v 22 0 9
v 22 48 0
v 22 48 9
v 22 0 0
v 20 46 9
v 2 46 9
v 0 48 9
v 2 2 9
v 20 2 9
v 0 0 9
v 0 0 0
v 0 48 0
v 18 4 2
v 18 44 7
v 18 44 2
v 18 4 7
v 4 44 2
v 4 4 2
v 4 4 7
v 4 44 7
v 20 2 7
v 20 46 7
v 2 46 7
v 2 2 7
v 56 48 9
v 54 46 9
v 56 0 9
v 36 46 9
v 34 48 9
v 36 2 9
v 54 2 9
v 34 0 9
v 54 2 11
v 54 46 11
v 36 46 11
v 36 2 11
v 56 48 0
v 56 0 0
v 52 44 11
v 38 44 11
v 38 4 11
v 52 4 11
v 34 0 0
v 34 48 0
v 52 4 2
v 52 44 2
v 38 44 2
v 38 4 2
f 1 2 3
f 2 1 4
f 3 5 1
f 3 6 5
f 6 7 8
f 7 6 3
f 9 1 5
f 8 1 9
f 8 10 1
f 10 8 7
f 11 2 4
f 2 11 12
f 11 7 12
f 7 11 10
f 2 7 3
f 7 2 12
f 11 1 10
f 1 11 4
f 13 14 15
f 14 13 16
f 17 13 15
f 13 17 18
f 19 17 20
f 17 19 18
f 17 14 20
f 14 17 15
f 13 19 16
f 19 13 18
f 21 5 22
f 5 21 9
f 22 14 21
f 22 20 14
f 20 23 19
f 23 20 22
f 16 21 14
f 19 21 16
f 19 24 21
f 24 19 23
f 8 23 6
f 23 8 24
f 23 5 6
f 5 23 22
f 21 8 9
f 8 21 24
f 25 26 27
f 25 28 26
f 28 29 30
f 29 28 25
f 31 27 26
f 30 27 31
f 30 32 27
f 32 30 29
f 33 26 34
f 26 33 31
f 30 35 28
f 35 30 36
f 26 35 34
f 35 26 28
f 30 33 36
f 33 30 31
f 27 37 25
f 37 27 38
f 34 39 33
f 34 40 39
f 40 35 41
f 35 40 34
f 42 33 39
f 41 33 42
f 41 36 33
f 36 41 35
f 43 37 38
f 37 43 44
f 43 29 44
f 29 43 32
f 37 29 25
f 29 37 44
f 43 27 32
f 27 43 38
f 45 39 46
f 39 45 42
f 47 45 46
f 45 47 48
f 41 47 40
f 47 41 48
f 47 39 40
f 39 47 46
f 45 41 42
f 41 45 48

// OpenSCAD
// [FL_INDEX: keywords="openscad, 3d_parametric, custom_pres_fit_box, csg_solid" | COT="Parametric OpenSCAD design from 3DCodeverse"]
// Title: custom pres fit box 

//CUSTOMIZER VARIABLES

// Internal X measurement in mm.
x = 14;
// Internal Y measurement in mm.
y = 40;
// Internal Z measurement in mm.
z = 14;
//CUSTOMIZER VARIABLES END


difference(){
cube([x+8,y+8,(z/2)+2]);
translate([4,4,2])cube([x,y,(z/2)+1]);
translate([2,2,z/2])cube([x+4,y+4,3]);
}
translate([x+20,0,0])
difference(){
cube([x+8,y+8,(z/2)+4]);
translate([4,4,2])cube([x,y,(z/2)+3]);

difference(){
translate([-1,-1,(z/2)+2])cube([x+12,y+12,3]);
translate([2,2,(z/2)+2])cube([x+4,y+4,6]);
}
}
